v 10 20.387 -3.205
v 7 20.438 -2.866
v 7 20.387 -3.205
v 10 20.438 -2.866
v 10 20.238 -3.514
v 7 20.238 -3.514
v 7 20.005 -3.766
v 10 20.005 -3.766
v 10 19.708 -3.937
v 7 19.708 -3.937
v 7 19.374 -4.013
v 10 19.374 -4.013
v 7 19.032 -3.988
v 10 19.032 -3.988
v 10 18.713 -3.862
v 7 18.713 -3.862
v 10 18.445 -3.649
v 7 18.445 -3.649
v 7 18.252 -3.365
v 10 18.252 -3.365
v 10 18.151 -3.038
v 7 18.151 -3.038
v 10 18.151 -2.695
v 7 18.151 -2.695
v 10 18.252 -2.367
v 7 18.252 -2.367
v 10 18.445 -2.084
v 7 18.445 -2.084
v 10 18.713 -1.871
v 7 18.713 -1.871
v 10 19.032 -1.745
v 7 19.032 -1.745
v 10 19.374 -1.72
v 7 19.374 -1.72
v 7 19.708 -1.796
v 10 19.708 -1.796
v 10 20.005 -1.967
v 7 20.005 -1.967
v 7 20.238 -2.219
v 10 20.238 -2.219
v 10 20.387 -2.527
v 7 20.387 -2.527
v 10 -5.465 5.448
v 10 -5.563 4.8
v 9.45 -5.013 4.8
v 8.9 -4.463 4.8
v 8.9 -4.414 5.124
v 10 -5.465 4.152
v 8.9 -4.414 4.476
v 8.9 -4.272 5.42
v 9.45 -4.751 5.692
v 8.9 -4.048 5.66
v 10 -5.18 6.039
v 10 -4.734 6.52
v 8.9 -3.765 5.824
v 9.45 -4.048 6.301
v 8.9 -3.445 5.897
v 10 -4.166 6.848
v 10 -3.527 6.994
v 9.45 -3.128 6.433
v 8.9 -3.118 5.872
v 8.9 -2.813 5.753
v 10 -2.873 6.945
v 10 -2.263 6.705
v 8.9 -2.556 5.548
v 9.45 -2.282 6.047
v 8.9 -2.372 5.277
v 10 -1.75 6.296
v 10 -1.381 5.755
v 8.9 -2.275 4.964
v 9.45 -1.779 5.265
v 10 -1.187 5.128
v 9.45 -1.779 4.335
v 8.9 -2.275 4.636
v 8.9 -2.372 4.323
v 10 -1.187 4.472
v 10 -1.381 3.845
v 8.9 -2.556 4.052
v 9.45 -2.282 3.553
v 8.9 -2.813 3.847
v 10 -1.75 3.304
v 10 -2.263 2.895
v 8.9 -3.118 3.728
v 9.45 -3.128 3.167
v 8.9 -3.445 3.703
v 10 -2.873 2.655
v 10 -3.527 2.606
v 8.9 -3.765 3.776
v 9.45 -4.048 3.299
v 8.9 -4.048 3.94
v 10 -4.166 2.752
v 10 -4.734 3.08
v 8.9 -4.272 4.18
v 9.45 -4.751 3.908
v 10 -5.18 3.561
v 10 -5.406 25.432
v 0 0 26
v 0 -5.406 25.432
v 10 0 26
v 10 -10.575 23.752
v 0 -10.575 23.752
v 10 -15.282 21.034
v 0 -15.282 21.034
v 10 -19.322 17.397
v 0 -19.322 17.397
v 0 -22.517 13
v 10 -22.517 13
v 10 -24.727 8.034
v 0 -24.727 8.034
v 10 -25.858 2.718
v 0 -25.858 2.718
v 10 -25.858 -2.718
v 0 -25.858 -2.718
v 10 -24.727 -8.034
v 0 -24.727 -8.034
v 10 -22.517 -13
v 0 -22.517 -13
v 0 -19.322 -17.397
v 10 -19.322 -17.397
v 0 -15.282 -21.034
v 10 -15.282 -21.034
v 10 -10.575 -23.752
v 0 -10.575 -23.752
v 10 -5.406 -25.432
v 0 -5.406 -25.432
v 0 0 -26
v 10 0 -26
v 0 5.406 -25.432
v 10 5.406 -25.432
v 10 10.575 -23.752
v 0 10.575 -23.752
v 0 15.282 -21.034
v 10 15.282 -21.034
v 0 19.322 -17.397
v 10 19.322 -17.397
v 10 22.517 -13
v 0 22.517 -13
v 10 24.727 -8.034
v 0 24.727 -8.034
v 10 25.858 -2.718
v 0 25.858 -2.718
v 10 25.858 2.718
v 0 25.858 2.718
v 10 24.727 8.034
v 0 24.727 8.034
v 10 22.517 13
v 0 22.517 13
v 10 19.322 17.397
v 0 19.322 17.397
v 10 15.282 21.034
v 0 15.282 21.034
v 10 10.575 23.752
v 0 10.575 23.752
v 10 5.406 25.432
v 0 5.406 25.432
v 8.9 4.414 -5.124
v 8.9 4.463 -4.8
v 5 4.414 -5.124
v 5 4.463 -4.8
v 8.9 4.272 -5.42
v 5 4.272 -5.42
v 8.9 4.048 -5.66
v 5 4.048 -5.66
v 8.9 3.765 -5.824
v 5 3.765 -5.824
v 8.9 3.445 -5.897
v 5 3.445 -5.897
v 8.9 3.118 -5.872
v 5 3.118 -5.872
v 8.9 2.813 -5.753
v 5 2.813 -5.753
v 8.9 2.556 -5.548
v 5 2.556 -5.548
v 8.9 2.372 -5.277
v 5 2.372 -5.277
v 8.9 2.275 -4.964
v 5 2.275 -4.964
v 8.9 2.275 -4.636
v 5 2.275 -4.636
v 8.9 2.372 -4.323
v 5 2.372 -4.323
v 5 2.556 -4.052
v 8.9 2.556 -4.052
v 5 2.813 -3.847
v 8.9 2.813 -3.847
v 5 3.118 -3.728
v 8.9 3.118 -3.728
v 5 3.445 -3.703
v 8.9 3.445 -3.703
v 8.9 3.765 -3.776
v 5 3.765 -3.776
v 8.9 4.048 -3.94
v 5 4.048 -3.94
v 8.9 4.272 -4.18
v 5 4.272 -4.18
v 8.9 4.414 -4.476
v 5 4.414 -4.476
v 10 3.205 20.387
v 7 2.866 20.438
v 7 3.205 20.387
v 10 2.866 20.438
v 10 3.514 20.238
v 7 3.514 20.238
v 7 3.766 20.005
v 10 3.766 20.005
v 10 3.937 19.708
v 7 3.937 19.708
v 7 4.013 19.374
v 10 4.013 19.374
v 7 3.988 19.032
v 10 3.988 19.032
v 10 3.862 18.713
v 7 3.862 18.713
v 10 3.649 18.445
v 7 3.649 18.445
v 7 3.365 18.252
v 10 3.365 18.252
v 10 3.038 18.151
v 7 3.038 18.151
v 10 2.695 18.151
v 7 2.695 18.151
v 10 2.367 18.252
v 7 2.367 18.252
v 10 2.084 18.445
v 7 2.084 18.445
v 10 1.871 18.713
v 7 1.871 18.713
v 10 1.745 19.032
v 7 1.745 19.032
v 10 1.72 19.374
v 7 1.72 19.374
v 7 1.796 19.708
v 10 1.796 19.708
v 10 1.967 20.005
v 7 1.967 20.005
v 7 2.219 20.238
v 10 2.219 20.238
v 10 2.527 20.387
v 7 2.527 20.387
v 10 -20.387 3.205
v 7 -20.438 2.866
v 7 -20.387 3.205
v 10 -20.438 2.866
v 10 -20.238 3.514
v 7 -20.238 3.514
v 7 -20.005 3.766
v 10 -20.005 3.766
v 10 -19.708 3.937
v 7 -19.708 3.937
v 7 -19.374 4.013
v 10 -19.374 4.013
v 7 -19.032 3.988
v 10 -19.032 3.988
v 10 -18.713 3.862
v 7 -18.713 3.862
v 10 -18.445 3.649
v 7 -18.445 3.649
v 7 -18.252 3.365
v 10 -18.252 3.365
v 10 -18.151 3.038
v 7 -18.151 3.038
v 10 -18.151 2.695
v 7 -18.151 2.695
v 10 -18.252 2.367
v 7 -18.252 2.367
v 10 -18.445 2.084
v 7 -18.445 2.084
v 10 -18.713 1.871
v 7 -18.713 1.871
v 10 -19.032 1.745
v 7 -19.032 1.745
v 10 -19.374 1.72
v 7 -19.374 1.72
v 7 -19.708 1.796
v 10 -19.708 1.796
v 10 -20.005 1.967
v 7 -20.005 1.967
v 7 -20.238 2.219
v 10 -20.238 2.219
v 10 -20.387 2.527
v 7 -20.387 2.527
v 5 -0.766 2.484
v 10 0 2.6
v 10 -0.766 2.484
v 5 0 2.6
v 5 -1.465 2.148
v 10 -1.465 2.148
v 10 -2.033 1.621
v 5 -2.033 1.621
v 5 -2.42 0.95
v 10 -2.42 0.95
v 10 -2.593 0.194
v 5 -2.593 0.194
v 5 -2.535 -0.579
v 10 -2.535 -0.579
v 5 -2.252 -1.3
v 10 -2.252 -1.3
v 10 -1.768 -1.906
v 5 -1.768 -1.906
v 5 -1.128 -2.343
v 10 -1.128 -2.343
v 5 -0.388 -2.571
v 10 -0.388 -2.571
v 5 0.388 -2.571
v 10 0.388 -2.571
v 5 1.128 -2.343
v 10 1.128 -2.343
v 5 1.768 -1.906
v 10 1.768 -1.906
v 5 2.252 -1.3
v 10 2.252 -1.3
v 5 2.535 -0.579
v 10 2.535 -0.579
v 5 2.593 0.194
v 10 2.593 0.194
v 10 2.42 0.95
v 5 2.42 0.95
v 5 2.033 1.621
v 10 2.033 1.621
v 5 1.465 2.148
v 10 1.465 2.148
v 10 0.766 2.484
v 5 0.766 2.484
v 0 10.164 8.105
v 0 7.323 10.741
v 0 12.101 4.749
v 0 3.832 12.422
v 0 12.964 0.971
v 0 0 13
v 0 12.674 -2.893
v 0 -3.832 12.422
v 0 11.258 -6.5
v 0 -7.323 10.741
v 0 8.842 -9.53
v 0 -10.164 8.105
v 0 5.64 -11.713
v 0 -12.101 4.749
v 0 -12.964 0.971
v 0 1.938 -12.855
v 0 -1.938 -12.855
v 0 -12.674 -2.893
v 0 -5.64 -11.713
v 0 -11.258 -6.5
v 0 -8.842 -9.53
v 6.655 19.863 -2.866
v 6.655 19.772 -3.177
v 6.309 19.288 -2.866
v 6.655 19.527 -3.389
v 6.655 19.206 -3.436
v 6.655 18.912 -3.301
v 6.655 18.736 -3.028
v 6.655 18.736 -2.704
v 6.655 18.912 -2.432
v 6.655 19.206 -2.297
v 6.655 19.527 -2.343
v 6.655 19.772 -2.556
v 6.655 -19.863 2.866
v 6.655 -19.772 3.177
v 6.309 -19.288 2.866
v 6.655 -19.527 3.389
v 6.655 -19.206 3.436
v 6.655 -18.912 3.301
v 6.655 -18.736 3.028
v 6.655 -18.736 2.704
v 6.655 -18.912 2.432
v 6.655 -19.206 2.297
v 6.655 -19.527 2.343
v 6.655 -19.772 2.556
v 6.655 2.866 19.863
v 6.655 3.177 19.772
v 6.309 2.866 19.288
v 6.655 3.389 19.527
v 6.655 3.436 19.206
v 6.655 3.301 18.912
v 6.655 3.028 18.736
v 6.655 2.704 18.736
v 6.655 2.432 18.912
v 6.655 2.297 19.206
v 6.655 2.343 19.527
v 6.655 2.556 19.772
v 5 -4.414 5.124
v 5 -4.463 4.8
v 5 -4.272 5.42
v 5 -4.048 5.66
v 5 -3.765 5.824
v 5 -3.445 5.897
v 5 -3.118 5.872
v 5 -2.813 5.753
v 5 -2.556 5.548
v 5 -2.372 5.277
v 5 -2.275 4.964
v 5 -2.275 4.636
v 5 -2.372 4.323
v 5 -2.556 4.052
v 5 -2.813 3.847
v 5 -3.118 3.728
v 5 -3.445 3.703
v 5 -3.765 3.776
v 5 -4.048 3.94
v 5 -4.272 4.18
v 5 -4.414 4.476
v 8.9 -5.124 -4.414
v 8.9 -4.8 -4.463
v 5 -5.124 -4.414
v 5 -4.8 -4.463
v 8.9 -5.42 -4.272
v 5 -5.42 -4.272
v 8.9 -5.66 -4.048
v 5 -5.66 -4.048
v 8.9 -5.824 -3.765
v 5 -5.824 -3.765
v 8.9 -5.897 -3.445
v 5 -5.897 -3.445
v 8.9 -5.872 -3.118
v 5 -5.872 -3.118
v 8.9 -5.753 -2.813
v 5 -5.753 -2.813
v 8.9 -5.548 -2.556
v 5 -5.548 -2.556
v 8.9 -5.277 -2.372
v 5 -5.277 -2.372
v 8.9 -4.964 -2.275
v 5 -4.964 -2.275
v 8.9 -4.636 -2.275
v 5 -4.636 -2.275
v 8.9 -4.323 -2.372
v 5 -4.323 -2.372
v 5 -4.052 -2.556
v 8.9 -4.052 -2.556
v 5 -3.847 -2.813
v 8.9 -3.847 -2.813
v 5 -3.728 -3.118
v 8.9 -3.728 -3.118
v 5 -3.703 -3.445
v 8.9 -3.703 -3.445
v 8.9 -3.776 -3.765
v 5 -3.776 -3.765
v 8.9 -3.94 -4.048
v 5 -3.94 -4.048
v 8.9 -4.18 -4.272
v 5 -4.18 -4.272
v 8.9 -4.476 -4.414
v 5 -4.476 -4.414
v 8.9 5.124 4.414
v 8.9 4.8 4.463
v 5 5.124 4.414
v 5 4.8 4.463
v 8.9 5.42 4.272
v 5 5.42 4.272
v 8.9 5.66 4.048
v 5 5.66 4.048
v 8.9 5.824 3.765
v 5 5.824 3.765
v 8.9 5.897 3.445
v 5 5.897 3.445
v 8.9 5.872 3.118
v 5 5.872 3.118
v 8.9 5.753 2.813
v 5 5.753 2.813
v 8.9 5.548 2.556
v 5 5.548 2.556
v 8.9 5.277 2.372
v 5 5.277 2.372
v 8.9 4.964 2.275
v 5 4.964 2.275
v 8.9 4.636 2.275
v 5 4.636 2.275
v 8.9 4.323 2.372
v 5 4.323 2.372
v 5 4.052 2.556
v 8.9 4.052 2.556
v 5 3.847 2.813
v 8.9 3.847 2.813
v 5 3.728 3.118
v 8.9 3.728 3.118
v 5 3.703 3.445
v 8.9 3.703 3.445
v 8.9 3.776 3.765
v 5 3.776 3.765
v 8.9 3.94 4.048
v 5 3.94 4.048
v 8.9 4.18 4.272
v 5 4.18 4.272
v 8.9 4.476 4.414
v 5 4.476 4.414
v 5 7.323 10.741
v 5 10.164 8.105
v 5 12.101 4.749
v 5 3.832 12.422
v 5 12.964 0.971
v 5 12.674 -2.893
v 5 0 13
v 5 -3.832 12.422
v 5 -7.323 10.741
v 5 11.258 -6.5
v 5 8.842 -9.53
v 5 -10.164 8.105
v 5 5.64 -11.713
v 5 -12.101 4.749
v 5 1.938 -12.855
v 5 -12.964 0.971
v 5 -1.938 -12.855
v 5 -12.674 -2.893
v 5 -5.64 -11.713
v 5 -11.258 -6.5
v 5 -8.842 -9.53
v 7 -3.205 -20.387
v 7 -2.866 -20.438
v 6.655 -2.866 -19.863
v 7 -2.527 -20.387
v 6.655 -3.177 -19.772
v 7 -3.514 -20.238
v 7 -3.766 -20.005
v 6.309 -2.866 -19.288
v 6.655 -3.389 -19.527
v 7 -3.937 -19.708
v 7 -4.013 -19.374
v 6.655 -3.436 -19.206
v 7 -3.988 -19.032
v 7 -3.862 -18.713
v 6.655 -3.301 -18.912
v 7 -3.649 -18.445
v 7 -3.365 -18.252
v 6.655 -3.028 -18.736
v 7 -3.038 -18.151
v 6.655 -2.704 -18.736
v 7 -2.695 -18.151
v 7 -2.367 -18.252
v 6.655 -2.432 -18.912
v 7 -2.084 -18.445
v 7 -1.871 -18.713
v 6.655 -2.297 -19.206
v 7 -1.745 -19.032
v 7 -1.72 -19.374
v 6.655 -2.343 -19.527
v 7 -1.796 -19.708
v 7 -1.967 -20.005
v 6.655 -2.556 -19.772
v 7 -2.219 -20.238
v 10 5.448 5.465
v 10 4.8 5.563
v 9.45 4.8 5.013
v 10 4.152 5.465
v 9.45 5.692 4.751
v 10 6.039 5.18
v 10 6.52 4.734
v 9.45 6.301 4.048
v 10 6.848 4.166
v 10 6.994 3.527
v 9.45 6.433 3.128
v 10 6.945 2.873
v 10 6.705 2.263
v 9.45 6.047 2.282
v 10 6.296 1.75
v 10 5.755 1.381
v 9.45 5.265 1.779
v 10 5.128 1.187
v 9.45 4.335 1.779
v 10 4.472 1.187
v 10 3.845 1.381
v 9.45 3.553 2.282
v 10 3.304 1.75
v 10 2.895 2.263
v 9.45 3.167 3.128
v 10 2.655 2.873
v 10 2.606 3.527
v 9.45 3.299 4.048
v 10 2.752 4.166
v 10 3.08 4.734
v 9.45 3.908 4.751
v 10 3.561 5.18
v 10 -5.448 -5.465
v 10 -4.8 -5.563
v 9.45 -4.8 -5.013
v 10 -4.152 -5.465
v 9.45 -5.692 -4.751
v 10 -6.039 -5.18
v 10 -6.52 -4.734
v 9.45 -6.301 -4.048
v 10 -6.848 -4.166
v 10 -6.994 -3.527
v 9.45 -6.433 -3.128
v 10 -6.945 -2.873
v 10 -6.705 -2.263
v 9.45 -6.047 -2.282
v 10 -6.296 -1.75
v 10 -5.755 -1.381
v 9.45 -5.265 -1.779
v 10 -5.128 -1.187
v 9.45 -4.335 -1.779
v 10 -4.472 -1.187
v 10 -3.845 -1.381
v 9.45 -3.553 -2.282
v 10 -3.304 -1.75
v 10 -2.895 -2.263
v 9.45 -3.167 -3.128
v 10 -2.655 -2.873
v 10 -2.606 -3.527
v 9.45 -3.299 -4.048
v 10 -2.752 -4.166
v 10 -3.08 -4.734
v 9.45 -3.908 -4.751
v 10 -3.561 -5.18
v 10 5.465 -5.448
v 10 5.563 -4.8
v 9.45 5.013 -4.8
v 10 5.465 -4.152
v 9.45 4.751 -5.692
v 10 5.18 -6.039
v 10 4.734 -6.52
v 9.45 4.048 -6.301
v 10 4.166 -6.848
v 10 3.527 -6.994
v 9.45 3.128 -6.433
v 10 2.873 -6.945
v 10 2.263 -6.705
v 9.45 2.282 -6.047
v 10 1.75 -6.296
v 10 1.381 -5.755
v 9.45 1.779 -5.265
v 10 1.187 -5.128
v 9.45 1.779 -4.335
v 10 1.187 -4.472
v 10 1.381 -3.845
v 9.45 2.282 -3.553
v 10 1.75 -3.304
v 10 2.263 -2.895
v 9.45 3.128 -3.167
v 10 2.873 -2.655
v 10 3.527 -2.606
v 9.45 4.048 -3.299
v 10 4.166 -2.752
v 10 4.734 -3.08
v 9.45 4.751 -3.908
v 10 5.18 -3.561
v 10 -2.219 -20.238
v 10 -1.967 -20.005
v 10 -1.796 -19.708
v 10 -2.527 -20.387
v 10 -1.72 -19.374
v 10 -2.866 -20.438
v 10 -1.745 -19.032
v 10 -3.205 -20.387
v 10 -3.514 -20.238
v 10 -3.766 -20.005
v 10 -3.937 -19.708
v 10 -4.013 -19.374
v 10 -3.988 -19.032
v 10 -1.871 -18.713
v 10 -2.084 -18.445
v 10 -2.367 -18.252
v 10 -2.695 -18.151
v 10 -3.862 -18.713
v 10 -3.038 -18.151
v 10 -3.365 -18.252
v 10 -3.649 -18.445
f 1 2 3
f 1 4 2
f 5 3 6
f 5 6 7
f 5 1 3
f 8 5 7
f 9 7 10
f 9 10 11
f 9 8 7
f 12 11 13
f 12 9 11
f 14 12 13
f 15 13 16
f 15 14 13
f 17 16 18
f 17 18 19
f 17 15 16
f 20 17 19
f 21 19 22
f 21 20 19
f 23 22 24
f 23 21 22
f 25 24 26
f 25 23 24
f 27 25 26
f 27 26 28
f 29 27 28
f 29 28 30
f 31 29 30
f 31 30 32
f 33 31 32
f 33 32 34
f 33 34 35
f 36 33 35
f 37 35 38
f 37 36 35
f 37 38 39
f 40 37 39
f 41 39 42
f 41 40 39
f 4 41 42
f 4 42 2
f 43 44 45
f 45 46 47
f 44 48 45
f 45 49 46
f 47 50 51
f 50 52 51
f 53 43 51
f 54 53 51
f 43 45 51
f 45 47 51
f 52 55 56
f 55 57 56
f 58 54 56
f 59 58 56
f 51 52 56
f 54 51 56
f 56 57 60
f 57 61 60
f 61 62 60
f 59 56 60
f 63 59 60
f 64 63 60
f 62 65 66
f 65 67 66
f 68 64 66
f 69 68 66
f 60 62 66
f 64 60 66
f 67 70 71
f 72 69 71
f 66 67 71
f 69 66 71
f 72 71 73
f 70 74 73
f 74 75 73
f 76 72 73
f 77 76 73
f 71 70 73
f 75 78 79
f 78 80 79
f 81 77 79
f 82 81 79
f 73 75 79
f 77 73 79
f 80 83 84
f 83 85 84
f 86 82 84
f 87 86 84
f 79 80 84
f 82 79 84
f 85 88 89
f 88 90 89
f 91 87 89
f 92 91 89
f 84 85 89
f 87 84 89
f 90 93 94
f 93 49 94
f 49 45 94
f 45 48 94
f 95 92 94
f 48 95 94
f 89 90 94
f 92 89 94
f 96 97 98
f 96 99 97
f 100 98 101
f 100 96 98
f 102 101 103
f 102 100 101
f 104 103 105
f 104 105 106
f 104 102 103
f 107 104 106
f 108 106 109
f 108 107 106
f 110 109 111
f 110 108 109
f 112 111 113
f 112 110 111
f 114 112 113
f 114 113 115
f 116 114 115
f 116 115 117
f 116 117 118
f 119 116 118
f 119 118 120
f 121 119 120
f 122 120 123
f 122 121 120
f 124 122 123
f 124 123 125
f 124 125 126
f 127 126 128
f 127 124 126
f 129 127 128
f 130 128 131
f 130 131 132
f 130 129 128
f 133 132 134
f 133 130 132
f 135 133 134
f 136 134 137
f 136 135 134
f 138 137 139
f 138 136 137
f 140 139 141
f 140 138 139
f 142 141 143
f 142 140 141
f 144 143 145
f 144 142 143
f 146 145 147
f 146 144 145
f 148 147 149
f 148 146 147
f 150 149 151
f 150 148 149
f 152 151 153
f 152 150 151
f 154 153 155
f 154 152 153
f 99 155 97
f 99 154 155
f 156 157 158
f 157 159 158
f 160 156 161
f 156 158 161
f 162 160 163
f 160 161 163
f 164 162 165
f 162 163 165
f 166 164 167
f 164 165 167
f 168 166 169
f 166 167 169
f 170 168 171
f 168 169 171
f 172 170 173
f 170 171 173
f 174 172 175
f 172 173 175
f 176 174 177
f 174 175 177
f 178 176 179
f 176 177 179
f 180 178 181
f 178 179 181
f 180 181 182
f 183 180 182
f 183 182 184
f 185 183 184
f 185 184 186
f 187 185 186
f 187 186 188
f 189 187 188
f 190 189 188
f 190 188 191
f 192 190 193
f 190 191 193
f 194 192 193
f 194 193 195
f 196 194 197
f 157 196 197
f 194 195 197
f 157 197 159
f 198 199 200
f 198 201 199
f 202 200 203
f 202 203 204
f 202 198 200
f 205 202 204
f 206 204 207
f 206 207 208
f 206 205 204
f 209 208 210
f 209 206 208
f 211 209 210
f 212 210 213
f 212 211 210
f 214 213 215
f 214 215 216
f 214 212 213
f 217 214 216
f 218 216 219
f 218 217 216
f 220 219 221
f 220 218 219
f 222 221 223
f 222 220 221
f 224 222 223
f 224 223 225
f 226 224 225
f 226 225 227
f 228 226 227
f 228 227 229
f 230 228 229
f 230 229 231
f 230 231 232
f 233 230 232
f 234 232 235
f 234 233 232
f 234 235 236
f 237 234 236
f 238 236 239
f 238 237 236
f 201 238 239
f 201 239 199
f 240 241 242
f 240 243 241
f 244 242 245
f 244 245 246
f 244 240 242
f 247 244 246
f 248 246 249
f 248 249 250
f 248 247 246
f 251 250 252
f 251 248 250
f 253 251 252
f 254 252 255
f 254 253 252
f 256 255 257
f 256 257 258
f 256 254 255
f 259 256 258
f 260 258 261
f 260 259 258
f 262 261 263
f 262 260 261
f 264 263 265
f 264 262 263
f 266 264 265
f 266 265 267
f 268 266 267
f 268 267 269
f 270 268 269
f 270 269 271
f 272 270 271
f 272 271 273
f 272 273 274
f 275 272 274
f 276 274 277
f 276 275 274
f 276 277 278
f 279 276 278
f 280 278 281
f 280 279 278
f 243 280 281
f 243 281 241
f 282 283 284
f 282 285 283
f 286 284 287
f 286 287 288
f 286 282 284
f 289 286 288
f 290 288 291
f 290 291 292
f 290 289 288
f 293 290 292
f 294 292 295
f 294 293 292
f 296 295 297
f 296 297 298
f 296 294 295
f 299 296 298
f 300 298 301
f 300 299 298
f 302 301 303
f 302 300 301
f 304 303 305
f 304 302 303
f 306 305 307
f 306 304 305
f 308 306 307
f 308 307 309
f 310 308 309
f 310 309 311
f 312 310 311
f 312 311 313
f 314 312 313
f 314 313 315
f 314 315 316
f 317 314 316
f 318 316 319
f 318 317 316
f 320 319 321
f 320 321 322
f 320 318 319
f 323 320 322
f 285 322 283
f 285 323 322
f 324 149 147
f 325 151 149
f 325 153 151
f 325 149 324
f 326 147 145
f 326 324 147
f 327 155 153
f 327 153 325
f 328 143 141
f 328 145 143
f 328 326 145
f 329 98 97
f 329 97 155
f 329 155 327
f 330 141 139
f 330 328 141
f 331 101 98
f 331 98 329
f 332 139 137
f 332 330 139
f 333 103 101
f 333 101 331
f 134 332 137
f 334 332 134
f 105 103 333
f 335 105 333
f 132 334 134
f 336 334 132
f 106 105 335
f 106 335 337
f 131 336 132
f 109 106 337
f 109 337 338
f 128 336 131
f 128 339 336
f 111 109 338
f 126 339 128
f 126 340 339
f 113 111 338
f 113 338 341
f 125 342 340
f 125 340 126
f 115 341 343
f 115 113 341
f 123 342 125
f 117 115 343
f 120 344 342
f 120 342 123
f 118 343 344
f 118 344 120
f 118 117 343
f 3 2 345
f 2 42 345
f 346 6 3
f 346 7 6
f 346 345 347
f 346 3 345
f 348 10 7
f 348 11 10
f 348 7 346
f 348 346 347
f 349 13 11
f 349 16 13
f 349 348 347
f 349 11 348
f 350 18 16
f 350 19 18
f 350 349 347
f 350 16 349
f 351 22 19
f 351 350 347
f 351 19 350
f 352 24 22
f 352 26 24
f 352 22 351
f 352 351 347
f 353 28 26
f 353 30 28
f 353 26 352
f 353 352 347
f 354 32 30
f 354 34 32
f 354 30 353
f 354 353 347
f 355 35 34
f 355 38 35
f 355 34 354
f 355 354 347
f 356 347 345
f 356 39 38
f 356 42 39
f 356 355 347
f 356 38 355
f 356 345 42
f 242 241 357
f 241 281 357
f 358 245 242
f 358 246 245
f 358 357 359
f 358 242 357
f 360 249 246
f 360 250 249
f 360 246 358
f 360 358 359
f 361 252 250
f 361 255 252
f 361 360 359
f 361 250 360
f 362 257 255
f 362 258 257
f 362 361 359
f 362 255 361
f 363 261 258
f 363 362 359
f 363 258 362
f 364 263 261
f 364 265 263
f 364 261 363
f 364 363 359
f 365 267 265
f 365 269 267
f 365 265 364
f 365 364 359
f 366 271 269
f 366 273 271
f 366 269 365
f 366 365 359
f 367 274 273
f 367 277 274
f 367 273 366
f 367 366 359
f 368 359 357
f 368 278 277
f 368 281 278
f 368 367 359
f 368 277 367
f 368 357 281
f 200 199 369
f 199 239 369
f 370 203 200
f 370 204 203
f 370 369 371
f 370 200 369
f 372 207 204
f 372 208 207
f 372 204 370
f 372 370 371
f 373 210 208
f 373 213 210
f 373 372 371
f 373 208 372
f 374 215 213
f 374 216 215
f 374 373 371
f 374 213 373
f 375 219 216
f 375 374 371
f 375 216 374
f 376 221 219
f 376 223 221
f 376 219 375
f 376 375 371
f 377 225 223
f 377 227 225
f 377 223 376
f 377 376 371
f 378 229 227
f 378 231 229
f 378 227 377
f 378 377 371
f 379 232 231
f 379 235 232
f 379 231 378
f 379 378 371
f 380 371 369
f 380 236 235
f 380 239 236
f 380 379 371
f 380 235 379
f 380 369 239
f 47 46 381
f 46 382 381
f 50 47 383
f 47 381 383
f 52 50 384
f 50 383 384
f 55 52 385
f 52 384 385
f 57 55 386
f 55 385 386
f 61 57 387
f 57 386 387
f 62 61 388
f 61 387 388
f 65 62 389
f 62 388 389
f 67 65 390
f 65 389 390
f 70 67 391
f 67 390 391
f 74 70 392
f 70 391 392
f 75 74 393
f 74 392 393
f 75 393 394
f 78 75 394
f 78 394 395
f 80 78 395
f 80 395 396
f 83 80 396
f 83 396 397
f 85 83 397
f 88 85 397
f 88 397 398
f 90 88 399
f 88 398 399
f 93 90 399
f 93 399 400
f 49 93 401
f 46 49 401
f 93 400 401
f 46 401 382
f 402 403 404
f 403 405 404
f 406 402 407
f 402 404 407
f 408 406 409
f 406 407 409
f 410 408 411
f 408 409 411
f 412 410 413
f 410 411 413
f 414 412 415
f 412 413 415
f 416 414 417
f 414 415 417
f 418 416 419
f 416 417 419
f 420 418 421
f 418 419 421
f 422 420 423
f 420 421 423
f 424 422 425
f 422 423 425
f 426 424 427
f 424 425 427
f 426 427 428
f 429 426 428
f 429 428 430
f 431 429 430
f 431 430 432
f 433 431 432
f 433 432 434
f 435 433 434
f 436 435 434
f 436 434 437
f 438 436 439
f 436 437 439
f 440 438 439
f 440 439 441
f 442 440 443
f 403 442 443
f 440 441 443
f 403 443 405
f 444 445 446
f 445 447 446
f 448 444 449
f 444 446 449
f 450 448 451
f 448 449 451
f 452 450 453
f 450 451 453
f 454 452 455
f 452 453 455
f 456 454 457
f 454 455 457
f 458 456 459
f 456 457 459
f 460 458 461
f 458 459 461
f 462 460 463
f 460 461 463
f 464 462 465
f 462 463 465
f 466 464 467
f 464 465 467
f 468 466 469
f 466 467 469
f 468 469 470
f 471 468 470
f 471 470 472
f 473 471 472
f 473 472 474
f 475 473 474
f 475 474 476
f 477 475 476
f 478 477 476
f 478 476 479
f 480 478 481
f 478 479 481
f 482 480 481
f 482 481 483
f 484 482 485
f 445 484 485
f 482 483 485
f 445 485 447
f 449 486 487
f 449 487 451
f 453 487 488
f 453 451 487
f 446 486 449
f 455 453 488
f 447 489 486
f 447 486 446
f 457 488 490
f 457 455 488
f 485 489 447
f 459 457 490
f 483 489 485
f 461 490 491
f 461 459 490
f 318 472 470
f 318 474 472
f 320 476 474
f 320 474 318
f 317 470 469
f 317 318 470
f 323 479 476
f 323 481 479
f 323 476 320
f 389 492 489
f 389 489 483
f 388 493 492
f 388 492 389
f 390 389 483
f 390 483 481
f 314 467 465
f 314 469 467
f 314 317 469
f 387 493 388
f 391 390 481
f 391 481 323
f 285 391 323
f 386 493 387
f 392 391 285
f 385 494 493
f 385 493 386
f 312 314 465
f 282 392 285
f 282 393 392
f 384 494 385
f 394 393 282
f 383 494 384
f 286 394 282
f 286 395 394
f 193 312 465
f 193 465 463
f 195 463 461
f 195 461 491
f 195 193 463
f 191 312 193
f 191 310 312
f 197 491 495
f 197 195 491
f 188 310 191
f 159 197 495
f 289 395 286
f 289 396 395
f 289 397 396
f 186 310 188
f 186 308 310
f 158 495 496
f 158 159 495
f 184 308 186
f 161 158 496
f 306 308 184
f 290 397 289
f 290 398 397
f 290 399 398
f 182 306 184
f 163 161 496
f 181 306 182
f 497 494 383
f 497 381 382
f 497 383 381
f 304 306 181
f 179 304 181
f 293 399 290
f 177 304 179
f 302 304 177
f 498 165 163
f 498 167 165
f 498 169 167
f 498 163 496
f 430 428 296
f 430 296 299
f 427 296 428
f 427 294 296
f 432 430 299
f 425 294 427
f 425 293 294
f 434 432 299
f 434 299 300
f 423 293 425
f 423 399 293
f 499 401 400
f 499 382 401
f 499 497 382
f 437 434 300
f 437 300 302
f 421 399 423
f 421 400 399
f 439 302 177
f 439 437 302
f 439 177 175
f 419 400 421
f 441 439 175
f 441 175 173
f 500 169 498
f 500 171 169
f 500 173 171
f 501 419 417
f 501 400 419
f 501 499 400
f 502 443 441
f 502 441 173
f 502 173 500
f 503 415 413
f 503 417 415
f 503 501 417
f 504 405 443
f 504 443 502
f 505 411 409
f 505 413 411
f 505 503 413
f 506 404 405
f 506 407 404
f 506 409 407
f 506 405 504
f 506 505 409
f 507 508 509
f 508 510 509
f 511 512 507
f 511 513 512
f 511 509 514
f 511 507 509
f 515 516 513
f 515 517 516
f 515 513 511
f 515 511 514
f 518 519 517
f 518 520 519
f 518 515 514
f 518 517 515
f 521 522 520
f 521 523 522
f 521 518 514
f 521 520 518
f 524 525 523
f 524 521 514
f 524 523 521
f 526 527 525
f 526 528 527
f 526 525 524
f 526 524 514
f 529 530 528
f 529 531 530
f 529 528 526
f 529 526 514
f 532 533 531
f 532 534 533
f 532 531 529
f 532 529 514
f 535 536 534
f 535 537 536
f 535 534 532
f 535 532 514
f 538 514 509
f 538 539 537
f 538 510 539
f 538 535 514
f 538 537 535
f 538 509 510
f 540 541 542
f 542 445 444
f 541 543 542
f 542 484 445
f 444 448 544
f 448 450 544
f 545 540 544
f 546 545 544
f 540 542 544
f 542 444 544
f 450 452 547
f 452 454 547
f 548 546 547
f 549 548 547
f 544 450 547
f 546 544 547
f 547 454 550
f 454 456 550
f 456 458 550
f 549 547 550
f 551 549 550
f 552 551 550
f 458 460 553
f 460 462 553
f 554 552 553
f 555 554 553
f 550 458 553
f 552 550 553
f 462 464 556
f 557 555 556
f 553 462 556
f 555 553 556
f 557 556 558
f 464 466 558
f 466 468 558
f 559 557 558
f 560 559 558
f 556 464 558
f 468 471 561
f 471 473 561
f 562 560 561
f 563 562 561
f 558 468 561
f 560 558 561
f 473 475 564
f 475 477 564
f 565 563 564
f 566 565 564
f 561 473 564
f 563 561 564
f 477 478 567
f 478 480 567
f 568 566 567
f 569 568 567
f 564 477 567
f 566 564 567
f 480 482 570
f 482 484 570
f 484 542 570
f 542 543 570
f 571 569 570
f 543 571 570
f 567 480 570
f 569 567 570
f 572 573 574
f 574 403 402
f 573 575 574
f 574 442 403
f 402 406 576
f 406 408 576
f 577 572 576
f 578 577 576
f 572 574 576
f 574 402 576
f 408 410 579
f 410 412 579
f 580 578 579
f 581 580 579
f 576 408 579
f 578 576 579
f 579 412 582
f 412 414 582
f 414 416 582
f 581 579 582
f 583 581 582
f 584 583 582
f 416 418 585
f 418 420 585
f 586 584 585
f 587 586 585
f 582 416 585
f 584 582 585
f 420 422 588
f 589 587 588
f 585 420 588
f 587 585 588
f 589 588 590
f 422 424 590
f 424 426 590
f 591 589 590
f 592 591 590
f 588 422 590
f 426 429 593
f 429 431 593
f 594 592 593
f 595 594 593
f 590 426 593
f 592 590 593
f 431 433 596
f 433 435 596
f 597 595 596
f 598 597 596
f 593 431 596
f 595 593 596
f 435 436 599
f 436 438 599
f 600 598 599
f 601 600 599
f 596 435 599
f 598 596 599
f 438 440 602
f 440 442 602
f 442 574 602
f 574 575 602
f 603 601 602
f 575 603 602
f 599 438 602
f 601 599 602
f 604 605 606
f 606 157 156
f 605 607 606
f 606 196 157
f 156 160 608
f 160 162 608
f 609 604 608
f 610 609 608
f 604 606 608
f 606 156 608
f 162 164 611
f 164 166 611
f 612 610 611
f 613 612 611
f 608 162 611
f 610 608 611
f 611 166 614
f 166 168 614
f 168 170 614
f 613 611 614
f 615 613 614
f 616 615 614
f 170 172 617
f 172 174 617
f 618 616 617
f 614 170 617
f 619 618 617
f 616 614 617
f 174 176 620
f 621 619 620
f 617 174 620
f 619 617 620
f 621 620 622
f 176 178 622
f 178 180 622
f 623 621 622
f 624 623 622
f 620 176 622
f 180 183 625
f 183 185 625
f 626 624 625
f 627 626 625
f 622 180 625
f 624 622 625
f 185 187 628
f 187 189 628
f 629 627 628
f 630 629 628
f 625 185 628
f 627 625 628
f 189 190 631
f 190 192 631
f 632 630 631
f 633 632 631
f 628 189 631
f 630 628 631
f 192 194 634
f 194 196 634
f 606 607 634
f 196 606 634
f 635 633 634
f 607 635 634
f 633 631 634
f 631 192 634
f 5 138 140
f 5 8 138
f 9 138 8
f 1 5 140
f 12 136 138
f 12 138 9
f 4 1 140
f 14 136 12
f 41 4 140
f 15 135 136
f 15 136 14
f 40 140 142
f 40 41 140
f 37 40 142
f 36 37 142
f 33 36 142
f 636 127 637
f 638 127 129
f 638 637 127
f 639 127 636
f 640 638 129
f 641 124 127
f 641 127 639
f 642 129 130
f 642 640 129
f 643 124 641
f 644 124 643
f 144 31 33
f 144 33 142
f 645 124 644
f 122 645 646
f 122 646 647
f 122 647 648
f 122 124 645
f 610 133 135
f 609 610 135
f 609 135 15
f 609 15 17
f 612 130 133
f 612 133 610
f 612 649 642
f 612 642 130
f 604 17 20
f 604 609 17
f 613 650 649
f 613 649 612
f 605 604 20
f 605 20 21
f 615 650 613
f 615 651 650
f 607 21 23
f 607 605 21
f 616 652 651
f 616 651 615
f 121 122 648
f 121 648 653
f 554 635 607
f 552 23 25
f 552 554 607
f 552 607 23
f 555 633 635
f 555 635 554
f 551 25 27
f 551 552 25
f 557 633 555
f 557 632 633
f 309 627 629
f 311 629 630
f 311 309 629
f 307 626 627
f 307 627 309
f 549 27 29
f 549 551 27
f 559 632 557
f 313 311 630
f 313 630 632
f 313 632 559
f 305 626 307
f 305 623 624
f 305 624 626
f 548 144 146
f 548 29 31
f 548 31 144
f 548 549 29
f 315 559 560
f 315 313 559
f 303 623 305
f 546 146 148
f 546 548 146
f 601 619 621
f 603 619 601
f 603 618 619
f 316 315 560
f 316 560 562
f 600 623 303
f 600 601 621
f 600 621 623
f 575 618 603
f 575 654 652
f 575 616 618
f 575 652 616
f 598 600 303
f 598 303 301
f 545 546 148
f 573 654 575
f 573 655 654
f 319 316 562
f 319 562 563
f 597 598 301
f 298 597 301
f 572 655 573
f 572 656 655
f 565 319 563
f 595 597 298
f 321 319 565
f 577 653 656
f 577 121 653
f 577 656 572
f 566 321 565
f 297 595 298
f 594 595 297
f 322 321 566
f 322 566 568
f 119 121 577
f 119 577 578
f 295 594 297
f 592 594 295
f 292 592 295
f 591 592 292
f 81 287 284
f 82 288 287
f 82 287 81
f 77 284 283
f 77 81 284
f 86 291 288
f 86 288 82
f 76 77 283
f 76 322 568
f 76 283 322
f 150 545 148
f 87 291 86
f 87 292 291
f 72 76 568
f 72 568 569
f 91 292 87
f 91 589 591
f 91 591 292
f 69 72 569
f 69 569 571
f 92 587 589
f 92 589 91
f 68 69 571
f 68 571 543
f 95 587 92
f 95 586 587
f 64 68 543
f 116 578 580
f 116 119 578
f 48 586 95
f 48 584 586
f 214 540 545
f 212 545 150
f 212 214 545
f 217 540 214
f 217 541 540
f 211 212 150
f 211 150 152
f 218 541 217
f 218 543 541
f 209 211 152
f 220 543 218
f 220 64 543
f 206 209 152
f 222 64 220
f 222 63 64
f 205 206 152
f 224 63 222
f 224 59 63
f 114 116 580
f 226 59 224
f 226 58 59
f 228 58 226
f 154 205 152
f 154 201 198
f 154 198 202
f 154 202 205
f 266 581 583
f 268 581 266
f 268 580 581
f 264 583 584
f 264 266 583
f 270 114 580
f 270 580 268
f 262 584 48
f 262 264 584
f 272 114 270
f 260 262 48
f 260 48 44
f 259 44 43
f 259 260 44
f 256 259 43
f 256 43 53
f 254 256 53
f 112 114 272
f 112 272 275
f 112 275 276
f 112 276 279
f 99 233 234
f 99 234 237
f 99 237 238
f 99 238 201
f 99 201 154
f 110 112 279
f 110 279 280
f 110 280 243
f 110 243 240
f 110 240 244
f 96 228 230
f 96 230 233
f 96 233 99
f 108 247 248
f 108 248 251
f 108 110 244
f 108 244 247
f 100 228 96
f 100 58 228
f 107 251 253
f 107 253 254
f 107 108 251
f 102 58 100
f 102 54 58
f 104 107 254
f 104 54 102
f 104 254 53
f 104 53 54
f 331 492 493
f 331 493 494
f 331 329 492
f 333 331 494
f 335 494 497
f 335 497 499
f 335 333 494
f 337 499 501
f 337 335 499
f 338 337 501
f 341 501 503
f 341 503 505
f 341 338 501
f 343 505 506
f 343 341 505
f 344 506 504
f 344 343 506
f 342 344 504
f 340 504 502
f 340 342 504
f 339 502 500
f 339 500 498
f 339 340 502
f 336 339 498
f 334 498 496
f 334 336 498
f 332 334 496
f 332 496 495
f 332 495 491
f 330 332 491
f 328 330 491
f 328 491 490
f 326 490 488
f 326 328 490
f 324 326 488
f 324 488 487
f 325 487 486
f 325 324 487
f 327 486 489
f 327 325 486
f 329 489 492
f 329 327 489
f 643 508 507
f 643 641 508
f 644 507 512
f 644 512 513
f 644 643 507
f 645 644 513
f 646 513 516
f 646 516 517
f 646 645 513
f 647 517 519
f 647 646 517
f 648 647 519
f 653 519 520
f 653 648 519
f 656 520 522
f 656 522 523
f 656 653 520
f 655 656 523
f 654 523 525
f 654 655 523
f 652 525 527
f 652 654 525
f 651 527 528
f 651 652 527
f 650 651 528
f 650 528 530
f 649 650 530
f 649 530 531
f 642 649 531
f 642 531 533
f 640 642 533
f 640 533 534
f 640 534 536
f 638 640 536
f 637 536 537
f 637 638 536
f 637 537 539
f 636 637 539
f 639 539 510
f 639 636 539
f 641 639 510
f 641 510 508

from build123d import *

# Parameters (mm, degrees)
HOLE_WIZARD_M22_D           = 2.2
HOLE_WIZARD_M22_CSINK_D     = 4.4
HOLE_WIZARD_M22_CSINK_ANGLE = 90
PATTERN_CIRCULAR_2_COUNT    = 4
PATTERN_CIRCULAR_3_COUNT    = 4


with BuildPart() as part:
    # Эскиз1 → Повернуть1 (revolve)
    with BuildSketch(Plane.XY):
        Polygon((0, 13), (0, 26), (10, 26), (10, 2.6), (5, 2.6), (5, 13), align=None)
    revolve(axis=Axis((0, 0, 0), (1, 0, 0)))

    # Зенковка для  винта с плоской головкой M22 (through all)
    with Locations(Plane(origin=(10, 0, 0), x_dir=(0, 0, -1), z_dir=(1, 0, 0))):
        with Locations((-3.362654925, 4.8)):
            hole_wizard_m22 = CounterSinkHole(HOLE_WIZARD_M22_D / 2, HOLE_WIZARD_M22_CSINK_D / 2, counter_sink_angle=HOLE_WIZARD_M22_CSINK_ANGLE)

    # Круговой массив2: Зенковка для  винта с плоской головкой M22 ×4 about axis
    pattern_circular_2_axis = Axis((10, 0, 0), (-1, 0, 0))
    for i in range(1, PATTERN_CIRCULAR_2_COUNT):
        add(hole_wizard_m22.rotate(pattern_circular_2_axis, i * 360 / PATTERN_CIRCULAR_2_COUNT), mode=Mode.SUBTRACT)

    # Эскиз7 → Сверло под метчик  спиральное M2.21 (revolve, cut)
    with BuildSketch(Plane(origin=(10, -2.866446976, -19.288169476), x_dir=(0, 0, -1), z_dir=(0, 1, 0))):
        Polygon((0, 0), (0, 3.690989712), (1.15, 3), (1.15, 0), align=None)
    hole_wizard_m2_21 = revolve(axis=Axis((16.35, -2.866446976, -19.288169476), (-1, 0, 0)), mode=Mode.SUBTRACT)

    # Круговой массив3: Сверло под метчик  спиральное M2.21 ×4 about axis
    pattern_circular_3_axis = Axis((10, 0, 0), (-1, 0, 0))
    for i in range(1, PATTERN_CIRCULAR_3_COUNT):
        add(hole_wizard_m2_21.rotate(pattern_circular_3_axis, i * 360 / PATTERN_CIRCULAR_3_COUNT), mode=Mode.SUBTRACT)


solid = part.part
